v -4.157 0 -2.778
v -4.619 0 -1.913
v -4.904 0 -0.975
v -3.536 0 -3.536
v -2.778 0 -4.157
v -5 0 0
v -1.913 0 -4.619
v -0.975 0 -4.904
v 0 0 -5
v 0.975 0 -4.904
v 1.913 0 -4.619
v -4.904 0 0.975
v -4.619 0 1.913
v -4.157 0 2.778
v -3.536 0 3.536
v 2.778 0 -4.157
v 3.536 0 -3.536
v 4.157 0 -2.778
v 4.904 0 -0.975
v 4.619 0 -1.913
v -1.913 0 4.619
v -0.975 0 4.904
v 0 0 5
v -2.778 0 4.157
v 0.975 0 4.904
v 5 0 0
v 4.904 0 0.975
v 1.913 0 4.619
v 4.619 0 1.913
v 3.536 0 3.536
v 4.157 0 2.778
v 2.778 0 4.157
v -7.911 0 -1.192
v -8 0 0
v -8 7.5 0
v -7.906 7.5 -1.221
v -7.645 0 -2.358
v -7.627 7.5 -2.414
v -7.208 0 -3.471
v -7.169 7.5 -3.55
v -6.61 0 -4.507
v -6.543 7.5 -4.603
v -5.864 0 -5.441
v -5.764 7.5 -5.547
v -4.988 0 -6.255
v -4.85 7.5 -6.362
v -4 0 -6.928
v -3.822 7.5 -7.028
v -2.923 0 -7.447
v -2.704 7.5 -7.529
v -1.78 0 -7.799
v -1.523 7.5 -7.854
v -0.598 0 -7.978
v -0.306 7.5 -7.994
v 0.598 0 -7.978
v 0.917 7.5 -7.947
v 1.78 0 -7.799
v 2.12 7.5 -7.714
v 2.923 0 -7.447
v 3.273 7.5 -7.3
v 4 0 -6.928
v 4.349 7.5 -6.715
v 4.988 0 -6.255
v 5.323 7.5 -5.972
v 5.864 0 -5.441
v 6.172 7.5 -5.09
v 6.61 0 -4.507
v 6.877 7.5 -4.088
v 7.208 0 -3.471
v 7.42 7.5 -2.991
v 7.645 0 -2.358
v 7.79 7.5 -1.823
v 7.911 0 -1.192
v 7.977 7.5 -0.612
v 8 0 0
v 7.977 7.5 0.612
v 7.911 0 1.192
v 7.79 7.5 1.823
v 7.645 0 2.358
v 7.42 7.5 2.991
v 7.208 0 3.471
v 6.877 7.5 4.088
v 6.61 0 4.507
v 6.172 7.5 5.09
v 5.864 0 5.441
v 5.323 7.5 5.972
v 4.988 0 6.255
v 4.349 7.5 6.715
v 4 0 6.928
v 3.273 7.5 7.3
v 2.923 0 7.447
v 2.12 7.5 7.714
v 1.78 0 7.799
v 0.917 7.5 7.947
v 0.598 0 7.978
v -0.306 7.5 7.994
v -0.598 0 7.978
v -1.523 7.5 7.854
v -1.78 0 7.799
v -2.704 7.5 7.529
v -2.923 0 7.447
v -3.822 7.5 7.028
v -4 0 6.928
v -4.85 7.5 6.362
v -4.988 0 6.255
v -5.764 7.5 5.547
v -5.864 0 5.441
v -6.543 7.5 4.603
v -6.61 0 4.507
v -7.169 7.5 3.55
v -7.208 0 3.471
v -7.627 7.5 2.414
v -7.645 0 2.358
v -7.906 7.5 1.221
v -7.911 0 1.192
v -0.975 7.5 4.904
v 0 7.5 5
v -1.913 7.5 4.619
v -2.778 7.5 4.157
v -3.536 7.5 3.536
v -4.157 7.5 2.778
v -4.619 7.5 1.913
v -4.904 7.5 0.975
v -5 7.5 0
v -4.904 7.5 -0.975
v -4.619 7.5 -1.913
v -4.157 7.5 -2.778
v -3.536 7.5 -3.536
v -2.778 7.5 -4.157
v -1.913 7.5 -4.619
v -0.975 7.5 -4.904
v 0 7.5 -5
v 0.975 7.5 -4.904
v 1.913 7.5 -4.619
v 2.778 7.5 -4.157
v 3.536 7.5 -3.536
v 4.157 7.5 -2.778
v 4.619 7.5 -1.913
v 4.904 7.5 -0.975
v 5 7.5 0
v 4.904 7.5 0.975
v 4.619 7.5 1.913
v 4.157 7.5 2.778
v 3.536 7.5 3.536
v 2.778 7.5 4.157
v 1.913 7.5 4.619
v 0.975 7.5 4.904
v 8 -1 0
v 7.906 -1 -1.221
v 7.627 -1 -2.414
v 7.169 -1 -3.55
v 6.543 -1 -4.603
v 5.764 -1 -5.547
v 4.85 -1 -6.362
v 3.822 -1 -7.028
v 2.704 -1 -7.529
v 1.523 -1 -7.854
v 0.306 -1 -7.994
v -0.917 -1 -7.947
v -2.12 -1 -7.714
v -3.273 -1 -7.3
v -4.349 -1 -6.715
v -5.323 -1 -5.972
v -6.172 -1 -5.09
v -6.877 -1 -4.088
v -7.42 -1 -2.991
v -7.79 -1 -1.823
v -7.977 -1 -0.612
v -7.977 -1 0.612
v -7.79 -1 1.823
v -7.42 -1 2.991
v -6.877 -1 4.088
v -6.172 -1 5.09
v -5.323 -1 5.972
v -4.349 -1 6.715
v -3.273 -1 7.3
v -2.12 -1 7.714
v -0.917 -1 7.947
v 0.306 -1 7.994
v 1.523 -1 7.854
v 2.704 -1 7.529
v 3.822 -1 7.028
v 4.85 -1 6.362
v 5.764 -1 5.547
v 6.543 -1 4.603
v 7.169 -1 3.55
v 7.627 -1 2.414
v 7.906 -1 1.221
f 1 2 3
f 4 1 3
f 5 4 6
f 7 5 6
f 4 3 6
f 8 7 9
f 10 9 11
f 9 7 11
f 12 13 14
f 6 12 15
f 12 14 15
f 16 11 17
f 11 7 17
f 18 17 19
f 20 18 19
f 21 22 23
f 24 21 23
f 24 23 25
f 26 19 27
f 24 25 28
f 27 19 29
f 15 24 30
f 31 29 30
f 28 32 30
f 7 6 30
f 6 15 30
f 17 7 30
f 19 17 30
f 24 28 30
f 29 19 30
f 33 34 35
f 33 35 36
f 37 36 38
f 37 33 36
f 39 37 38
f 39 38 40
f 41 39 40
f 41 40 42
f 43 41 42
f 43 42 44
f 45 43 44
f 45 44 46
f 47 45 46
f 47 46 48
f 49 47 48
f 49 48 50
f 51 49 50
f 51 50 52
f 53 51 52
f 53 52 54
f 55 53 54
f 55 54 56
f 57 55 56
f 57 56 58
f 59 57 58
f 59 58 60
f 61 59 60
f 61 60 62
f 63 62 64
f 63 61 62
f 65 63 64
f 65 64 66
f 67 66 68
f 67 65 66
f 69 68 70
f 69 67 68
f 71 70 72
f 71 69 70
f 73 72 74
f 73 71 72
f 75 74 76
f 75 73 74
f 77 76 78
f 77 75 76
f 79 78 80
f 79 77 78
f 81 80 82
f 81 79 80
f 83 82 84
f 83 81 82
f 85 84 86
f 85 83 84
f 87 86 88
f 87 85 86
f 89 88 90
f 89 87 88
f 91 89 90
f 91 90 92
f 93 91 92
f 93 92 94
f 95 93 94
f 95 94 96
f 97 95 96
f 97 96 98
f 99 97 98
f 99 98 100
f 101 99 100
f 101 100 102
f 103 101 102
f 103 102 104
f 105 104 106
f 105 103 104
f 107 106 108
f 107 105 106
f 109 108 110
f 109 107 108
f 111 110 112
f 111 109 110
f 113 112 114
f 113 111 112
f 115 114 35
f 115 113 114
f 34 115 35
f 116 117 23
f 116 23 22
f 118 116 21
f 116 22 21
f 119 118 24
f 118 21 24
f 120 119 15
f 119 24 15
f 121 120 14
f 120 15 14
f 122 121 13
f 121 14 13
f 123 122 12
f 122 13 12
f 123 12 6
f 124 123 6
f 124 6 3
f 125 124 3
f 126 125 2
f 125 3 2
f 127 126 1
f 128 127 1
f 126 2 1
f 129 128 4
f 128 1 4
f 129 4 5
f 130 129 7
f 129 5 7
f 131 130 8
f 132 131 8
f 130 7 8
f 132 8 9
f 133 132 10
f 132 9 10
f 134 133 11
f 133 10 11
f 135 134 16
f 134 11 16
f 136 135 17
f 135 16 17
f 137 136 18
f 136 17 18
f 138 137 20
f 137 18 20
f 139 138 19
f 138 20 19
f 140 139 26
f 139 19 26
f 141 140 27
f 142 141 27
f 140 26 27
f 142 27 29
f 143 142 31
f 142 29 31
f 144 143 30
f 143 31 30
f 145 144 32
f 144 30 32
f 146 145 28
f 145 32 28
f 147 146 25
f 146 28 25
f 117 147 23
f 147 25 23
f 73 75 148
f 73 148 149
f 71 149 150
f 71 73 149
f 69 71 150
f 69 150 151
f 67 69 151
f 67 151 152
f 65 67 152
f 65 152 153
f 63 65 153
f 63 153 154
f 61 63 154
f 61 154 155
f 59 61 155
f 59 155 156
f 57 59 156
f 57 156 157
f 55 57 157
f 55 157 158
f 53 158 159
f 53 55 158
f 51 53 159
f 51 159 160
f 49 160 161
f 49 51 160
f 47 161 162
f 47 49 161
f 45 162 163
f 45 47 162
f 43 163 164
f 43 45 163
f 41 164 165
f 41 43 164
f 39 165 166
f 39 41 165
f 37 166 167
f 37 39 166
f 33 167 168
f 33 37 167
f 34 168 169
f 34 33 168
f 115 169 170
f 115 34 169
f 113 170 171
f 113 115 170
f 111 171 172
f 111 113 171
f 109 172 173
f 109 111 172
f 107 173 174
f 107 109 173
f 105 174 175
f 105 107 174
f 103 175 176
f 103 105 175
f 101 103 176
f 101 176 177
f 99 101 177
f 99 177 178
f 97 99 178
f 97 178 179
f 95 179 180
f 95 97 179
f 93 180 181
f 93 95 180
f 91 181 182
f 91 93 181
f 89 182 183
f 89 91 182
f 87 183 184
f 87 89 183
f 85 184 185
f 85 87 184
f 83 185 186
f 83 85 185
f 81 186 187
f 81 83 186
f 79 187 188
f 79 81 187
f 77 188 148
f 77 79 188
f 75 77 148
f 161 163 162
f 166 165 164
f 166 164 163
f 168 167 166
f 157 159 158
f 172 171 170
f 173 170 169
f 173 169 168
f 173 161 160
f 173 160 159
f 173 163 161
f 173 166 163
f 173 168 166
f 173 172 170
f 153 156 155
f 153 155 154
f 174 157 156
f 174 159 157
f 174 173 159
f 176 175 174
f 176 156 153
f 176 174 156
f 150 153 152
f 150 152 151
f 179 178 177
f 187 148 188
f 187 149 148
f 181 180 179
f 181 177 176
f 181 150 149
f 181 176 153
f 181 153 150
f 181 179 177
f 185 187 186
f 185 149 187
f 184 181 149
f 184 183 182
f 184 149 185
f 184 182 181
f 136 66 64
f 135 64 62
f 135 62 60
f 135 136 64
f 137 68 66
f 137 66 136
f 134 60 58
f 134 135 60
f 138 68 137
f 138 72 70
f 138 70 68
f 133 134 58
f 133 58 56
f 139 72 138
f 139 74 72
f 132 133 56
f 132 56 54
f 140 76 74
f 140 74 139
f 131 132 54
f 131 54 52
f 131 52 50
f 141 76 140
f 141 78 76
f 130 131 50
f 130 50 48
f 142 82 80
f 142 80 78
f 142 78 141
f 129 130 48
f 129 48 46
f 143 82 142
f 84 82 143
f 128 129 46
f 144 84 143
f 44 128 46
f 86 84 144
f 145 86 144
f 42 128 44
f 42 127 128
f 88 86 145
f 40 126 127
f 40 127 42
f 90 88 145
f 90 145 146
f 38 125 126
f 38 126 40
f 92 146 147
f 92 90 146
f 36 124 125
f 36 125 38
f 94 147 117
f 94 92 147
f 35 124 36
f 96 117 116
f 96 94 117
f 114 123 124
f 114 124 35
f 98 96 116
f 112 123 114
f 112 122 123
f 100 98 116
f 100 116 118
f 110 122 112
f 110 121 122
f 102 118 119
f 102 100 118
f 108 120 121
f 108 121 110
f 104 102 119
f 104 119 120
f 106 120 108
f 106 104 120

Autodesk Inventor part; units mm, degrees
ref_plane "YZ Plane" through (0, 0, 0) normal (1, 0, 0) x (0, 1, 0)
ref_plane "XZ Plane" through (0, 0, 0) normal (0, 1, 0) x (-1, 0, 0)
ref_plane "XY Plane" through (0, 0, 0) normal (0, 0, 1) x (1, 0, 0)
sketch "Sketch1" plane through (0, 0, 0) normal (0, 1, 0) x (-1, 0, 0)
  circle A0 centre (0, 0) radius 8
  dimension "d0" = 16
extrude "Extrusion1" add sketch "Sketch1" along normal blind 7.5
sketch "Sketch2" plane through (0, 7.5, 0) normal (0, 1, 0) x (1, 0, 0)
  circle A0 centre (0, 0) radius 8 projected
  line L0 (8, 0) -> (-8, 0)
  line L1 (0, -8) -> (0, 8)
hole "Hole1" at (0, 7.5, 0) direction (0, -1, 0) diameter 10 end through all
sketch "Sketch3" plane through (0, 0, 0) normal (0, -1, 0) x (1, 0, 0)
  circle A0 centre (0, 0) radius 8
extrude "Extrusion2" add sketch "Sketch3" along normal blind 1
properties part number "Drukhulse"
